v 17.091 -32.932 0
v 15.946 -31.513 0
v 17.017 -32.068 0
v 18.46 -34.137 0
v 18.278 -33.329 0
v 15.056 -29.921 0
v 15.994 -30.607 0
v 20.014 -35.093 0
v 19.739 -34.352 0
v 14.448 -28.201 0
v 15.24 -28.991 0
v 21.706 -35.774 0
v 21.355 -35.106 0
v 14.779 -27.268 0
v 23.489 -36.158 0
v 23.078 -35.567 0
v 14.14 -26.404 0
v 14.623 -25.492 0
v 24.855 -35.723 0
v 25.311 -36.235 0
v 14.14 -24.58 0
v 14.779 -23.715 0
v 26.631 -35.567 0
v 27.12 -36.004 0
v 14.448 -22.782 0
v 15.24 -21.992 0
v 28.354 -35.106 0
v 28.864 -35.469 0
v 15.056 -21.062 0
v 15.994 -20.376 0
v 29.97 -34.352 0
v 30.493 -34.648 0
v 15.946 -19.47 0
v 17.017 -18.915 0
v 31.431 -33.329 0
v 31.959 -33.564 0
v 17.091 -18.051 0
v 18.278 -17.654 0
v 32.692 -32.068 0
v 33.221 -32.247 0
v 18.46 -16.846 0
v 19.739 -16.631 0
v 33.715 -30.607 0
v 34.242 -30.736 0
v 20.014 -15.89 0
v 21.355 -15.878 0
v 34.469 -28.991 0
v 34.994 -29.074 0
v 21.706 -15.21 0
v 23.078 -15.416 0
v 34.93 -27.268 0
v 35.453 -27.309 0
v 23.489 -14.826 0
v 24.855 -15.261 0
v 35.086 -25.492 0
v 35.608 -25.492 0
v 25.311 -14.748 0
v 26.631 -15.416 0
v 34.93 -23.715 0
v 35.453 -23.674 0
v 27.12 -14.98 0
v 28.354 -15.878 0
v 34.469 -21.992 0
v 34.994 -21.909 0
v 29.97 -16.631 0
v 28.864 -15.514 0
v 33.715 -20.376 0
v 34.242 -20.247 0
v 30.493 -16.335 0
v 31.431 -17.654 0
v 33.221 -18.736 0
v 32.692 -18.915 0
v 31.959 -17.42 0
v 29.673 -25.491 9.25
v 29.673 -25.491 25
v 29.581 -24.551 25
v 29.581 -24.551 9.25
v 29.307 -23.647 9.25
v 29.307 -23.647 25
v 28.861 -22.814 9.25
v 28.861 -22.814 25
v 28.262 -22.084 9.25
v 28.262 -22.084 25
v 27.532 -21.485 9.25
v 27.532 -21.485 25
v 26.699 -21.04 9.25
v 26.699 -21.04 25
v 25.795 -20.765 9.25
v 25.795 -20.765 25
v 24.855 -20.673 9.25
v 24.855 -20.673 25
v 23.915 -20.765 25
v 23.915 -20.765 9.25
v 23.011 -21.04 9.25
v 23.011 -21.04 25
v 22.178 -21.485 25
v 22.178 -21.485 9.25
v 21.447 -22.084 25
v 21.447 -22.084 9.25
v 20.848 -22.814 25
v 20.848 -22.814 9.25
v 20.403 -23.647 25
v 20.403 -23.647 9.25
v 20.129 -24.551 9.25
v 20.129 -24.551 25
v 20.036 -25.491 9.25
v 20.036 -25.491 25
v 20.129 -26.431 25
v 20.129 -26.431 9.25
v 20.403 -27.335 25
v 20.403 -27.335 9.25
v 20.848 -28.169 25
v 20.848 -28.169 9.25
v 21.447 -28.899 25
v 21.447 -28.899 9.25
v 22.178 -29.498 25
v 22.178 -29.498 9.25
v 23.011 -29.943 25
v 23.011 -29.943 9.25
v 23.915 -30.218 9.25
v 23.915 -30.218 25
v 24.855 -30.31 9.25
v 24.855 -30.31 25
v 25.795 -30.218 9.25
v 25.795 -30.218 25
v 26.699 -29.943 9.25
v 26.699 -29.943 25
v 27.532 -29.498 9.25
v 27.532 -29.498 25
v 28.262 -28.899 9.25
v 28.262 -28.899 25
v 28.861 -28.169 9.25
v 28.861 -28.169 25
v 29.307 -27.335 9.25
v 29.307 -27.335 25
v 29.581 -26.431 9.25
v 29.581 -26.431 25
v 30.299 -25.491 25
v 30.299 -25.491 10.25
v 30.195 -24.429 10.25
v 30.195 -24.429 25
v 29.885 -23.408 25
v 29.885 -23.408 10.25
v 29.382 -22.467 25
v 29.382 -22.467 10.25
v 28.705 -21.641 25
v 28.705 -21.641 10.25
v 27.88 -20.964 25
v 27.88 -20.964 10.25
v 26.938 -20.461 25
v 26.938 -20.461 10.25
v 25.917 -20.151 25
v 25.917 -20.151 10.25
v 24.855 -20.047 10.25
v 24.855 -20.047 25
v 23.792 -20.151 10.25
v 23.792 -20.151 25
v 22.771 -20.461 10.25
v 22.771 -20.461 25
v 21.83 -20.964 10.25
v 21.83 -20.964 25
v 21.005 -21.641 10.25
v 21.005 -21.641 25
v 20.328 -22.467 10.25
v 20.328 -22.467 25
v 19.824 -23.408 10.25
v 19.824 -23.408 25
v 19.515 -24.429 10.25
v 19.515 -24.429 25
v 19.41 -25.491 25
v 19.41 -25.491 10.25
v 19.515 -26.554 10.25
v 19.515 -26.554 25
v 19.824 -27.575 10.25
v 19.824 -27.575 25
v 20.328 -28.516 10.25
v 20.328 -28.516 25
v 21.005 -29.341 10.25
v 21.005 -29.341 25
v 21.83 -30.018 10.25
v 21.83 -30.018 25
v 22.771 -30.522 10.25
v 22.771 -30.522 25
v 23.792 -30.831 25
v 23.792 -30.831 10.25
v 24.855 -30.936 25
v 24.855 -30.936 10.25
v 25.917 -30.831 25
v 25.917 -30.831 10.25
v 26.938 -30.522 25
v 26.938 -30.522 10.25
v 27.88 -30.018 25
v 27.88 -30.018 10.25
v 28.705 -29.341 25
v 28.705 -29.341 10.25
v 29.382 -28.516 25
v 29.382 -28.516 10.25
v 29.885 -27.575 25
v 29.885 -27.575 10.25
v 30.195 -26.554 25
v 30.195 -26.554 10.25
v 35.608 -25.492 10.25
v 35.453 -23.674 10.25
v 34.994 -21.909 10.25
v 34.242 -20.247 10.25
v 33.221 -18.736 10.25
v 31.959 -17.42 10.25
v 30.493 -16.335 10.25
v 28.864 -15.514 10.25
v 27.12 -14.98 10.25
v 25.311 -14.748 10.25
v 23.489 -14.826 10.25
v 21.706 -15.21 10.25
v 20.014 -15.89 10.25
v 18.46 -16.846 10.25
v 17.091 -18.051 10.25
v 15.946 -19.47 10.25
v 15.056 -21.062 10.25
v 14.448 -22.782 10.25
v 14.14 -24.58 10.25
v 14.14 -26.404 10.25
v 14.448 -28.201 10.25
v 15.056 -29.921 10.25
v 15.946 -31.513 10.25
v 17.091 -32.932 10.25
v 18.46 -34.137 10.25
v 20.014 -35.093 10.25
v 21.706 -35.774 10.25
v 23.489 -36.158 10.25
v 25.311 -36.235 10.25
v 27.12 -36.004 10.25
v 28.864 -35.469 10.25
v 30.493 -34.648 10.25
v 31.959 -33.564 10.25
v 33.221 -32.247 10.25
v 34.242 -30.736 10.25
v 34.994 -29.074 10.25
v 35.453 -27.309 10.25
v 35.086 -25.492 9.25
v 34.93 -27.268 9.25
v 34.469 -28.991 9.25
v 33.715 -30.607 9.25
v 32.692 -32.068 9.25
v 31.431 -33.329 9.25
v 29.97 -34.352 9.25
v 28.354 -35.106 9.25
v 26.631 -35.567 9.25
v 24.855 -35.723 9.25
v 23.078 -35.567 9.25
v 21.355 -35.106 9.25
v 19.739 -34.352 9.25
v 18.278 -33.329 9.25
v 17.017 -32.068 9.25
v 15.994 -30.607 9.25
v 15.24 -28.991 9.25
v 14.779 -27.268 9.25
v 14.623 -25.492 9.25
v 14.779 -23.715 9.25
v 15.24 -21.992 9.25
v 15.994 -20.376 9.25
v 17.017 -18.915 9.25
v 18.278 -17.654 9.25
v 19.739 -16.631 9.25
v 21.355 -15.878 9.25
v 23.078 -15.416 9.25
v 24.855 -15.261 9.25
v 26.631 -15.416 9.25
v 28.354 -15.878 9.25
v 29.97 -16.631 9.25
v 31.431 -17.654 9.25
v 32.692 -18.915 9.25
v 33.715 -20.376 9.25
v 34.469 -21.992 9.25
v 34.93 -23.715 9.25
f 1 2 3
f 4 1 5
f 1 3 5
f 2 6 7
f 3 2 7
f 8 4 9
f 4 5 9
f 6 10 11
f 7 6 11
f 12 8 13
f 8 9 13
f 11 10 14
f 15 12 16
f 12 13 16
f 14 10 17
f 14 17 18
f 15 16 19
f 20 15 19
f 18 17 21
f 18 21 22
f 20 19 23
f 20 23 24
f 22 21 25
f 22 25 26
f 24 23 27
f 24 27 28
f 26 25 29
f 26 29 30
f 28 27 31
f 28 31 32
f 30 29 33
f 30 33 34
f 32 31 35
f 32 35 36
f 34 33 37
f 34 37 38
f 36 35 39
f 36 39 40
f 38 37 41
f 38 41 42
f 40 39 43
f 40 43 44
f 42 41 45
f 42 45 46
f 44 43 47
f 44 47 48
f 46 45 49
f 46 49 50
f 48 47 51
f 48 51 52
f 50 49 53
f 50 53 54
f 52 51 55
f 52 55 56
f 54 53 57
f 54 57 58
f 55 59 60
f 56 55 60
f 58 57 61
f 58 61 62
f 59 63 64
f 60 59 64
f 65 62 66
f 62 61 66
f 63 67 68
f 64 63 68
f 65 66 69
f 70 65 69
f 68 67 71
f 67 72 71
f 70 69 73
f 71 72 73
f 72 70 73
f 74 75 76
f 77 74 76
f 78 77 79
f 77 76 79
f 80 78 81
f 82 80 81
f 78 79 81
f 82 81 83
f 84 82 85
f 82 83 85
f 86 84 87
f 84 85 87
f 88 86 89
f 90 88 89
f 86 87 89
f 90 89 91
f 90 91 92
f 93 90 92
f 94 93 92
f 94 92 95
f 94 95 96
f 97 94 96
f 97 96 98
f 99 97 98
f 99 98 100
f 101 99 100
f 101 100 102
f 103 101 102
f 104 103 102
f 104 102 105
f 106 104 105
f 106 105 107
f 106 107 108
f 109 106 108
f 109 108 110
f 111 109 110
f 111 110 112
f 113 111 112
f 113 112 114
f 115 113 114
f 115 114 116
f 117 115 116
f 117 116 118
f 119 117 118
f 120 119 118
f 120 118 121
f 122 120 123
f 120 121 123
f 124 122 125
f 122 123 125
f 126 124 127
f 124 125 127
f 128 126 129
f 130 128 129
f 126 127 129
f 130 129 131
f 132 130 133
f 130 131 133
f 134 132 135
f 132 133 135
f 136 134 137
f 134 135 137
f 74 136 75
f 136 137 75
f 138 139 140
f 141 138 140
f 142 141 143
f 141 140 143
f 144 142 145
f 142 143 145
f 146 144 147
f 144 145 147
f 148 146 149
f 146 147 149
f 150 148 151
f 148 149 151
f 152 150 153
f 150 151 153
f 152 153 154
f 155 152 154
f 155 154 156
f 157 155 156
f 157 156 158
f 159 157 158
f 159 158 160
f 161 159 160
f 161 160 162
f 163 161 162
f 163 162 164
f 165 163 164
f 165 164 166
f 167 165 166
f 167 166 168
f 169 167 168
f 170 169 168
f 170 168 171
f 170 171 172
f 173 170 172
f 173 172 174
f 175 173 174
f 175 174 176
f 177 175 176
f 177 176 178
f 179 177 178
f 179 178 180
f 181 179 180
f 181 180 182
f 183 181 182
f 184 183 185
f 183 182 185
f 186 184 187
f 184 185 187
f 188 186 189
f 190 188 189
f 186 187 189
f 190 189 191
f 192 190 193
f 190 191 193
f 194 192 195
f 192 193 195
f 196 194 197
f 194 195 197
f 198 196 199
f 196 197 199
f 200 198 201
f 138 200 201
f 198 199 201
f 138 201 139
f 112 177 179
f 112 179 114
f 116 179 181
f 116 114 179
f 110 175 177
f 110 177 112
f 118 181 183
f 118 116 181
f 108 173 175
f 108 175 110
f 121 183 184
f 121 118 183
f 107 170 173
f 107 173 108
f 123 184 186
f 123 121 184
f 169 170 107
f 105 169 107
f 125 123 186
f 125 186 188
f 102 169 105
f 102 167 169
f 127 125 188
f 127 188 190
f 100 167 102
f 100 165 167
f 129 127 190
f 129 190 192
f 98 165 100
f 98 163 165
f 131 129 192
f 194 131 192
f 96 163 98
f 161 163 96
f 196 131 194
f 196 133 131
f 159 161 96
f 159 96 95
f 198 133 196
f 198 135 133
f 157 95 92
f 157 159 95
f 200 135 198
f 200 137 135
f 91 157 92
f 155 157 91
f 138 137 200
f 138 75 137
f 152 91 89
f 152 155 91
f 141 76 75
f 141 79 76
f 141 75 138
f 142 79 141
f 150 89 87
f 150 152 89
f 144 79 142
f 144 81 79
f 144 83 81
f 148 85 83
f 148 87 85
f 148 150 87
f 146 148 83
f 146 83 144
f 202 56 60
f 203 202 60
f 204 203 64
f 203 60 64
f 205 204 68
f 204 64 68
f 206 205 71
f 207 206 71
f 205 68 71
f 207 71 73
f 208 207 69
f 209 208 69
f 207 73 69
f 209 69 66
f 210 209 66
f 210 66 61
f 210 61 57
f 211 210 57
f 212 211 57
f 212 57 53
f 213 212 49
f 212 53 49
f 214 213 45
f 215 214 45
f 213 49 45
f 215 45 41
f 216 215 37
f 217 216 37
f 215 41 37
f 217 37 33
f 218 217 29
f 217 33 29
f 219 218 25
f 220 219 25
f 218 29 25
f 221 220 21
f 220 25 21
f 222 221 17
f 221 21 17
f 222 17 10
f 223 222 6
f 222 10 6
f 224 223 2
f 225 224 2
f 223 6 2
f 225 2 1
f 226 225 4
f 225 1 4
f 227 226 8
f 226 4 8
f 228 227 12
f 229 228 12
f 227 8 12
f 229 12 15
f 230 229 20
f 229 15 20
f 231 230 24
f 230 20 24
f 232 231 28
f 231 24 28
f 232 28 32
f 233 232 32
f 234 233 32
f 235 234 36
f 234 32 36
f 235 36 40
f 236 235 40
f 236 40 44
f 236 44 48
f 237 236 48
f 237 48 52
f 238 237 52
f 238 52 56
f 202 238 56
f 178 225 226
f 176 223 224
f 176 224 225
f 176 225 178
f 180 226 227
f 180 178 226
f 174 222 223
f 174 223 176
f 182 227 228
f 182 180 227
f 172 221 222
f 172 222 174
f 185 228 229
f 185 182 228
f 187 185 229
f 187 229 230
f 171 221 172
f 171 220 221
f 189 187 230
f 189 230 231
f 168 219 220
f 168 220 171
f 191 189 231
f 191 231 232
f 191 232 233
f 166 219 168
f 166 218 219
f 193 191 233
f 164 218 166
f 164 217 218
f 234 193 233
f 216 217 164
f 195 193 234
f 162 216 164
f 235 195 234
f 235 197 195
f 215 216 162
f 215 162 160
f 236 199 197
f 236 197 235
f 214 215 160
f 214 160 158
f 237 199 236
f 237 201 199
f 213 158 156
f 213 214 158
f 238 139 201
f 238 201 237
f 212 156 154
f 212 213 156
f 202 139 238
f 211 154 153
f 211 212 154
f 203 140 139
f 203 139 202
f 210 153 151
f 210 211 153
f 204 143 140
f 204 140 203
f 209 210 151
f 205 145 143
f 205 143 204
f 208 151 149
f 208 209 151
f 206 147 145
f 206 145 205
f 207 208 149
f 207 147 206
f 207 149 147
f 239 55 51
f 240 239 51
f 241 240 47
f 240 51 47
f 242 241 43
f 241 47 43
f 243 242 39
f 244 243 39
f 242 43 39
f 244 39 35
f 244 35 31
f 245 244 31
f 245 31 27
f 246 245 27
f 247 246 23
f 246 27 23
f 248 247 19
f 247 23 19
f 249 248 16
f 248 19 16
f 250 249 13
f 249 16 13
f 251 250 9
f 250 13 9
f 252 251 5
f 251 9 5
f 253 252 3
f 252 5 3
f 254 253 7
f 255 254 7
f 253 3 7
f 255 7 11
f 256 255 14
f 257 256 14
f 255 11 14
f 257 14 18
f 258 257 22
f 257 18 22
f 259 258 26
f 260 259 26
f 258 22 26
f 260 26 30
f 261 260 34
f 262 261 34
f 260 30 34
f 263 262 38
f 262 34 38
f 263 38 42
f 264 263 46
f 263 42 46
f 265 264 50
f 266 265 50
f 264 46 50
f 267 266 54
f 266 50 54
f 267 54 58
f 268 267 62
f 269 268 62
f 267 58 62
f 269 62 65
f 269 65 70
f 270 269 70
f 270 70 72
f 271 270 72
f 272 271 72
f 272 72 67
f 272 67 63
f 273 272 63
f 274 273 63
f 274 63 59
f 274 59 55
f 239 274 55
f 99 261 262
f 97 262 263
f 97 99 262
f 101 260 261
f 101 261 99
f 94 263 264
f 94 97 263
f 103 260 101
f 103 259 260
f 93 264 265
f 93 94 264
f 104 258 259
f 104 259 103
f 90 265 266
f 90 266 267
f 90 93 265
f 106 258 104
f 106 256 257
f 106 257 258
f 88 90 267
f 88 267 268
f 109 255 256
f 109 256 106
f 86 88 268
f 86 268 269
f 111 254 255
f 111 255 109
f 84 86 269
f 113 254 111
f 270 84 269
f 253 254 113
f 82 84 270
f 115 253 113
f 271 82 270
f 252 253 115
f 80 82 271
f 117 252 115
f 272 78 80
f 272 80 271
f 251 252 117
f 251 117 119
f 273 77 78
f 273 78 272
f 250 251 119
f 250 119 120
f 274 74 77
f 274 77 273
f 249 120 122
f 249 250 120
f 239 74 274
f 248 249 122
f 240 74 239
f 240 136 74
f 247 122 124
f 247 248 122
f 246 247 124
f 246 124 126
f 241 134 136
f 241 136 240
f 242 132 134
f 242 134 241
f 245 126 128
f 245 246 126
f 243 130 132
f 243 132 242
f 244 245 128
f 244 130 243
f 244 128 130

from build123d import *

# Parameters (mm, degrees)
F1_R      = 5.444651
F2_DEPTH  = 25
F0_R      = 10.753152
F3_DEPTH  = 10.25
F4_R      = 9.987973
F5_DEPTH  = 9.25
F6_R      = 10.118676
F7_DEPTH  = 9.25
F8_R      = 10.231206
F9_DEPTH  = 9.25
F10_R     = 4.818697
F11_DEPTH = 25


with BuildPart() as f2:
    # F1 (on face) → F2 (new body)
    with BuildSketch(Plane.XY):
        with Locations((24.854638, -25.491413)):
            Circle(F1_R)
    extrude(amount=F2_DEPTH)

    # F0 (on Top) → F3 (join)
    with BuildSketch(Plane.XY):
        with Locations((24.854667, -25.49172)):
            Circle(F0_R)
    extrude(amount=F3_DEPTH)

    # F4 (on face) → F5 (join)
    with BuildSketch(Plane(origin=(0, 0, 0), x_dir=(1, 0, 0), z_dir=(0, 0, -1))):
        with Locations((24.854667, 25.49172)):
            Circle(F4_R)
    extrude(amount=-F5_DEPTH)

    # F6 (on face) → F7 (join)
    with BuildSketch(Plane(origin=(0, 0, 0), x_dir=(1, 0, 0), z_dir=(0, 0, -1))):
        with Locations((24.854667, 25.49172)):
            Circle(F6_R)
    extrude(amount=-F7_DEPTH)

    # F8 (on face) → F9 (cut)
    with BuildSketch(Plane(origin=(0, 0, 0), x_dir=(1, 0, 0), z_dir=(0, 0, -1))):
        with Locations((24.854667, 25.49172)):
            Circle(F8_R)
    extrude(amount=-F9_DEPTH, mode=Mode.SUBTRACT)

    # F10 (on face) → F11 (cut)
    with BuildSketch(Plane.XY.offset(25)):
        with Locations((24.854638, -25.491413)):
            Circle(F10_R)
    extrude(amount=-F11_DEPTH, mode=Mode.SUBTRACT)


solid = f2.part
